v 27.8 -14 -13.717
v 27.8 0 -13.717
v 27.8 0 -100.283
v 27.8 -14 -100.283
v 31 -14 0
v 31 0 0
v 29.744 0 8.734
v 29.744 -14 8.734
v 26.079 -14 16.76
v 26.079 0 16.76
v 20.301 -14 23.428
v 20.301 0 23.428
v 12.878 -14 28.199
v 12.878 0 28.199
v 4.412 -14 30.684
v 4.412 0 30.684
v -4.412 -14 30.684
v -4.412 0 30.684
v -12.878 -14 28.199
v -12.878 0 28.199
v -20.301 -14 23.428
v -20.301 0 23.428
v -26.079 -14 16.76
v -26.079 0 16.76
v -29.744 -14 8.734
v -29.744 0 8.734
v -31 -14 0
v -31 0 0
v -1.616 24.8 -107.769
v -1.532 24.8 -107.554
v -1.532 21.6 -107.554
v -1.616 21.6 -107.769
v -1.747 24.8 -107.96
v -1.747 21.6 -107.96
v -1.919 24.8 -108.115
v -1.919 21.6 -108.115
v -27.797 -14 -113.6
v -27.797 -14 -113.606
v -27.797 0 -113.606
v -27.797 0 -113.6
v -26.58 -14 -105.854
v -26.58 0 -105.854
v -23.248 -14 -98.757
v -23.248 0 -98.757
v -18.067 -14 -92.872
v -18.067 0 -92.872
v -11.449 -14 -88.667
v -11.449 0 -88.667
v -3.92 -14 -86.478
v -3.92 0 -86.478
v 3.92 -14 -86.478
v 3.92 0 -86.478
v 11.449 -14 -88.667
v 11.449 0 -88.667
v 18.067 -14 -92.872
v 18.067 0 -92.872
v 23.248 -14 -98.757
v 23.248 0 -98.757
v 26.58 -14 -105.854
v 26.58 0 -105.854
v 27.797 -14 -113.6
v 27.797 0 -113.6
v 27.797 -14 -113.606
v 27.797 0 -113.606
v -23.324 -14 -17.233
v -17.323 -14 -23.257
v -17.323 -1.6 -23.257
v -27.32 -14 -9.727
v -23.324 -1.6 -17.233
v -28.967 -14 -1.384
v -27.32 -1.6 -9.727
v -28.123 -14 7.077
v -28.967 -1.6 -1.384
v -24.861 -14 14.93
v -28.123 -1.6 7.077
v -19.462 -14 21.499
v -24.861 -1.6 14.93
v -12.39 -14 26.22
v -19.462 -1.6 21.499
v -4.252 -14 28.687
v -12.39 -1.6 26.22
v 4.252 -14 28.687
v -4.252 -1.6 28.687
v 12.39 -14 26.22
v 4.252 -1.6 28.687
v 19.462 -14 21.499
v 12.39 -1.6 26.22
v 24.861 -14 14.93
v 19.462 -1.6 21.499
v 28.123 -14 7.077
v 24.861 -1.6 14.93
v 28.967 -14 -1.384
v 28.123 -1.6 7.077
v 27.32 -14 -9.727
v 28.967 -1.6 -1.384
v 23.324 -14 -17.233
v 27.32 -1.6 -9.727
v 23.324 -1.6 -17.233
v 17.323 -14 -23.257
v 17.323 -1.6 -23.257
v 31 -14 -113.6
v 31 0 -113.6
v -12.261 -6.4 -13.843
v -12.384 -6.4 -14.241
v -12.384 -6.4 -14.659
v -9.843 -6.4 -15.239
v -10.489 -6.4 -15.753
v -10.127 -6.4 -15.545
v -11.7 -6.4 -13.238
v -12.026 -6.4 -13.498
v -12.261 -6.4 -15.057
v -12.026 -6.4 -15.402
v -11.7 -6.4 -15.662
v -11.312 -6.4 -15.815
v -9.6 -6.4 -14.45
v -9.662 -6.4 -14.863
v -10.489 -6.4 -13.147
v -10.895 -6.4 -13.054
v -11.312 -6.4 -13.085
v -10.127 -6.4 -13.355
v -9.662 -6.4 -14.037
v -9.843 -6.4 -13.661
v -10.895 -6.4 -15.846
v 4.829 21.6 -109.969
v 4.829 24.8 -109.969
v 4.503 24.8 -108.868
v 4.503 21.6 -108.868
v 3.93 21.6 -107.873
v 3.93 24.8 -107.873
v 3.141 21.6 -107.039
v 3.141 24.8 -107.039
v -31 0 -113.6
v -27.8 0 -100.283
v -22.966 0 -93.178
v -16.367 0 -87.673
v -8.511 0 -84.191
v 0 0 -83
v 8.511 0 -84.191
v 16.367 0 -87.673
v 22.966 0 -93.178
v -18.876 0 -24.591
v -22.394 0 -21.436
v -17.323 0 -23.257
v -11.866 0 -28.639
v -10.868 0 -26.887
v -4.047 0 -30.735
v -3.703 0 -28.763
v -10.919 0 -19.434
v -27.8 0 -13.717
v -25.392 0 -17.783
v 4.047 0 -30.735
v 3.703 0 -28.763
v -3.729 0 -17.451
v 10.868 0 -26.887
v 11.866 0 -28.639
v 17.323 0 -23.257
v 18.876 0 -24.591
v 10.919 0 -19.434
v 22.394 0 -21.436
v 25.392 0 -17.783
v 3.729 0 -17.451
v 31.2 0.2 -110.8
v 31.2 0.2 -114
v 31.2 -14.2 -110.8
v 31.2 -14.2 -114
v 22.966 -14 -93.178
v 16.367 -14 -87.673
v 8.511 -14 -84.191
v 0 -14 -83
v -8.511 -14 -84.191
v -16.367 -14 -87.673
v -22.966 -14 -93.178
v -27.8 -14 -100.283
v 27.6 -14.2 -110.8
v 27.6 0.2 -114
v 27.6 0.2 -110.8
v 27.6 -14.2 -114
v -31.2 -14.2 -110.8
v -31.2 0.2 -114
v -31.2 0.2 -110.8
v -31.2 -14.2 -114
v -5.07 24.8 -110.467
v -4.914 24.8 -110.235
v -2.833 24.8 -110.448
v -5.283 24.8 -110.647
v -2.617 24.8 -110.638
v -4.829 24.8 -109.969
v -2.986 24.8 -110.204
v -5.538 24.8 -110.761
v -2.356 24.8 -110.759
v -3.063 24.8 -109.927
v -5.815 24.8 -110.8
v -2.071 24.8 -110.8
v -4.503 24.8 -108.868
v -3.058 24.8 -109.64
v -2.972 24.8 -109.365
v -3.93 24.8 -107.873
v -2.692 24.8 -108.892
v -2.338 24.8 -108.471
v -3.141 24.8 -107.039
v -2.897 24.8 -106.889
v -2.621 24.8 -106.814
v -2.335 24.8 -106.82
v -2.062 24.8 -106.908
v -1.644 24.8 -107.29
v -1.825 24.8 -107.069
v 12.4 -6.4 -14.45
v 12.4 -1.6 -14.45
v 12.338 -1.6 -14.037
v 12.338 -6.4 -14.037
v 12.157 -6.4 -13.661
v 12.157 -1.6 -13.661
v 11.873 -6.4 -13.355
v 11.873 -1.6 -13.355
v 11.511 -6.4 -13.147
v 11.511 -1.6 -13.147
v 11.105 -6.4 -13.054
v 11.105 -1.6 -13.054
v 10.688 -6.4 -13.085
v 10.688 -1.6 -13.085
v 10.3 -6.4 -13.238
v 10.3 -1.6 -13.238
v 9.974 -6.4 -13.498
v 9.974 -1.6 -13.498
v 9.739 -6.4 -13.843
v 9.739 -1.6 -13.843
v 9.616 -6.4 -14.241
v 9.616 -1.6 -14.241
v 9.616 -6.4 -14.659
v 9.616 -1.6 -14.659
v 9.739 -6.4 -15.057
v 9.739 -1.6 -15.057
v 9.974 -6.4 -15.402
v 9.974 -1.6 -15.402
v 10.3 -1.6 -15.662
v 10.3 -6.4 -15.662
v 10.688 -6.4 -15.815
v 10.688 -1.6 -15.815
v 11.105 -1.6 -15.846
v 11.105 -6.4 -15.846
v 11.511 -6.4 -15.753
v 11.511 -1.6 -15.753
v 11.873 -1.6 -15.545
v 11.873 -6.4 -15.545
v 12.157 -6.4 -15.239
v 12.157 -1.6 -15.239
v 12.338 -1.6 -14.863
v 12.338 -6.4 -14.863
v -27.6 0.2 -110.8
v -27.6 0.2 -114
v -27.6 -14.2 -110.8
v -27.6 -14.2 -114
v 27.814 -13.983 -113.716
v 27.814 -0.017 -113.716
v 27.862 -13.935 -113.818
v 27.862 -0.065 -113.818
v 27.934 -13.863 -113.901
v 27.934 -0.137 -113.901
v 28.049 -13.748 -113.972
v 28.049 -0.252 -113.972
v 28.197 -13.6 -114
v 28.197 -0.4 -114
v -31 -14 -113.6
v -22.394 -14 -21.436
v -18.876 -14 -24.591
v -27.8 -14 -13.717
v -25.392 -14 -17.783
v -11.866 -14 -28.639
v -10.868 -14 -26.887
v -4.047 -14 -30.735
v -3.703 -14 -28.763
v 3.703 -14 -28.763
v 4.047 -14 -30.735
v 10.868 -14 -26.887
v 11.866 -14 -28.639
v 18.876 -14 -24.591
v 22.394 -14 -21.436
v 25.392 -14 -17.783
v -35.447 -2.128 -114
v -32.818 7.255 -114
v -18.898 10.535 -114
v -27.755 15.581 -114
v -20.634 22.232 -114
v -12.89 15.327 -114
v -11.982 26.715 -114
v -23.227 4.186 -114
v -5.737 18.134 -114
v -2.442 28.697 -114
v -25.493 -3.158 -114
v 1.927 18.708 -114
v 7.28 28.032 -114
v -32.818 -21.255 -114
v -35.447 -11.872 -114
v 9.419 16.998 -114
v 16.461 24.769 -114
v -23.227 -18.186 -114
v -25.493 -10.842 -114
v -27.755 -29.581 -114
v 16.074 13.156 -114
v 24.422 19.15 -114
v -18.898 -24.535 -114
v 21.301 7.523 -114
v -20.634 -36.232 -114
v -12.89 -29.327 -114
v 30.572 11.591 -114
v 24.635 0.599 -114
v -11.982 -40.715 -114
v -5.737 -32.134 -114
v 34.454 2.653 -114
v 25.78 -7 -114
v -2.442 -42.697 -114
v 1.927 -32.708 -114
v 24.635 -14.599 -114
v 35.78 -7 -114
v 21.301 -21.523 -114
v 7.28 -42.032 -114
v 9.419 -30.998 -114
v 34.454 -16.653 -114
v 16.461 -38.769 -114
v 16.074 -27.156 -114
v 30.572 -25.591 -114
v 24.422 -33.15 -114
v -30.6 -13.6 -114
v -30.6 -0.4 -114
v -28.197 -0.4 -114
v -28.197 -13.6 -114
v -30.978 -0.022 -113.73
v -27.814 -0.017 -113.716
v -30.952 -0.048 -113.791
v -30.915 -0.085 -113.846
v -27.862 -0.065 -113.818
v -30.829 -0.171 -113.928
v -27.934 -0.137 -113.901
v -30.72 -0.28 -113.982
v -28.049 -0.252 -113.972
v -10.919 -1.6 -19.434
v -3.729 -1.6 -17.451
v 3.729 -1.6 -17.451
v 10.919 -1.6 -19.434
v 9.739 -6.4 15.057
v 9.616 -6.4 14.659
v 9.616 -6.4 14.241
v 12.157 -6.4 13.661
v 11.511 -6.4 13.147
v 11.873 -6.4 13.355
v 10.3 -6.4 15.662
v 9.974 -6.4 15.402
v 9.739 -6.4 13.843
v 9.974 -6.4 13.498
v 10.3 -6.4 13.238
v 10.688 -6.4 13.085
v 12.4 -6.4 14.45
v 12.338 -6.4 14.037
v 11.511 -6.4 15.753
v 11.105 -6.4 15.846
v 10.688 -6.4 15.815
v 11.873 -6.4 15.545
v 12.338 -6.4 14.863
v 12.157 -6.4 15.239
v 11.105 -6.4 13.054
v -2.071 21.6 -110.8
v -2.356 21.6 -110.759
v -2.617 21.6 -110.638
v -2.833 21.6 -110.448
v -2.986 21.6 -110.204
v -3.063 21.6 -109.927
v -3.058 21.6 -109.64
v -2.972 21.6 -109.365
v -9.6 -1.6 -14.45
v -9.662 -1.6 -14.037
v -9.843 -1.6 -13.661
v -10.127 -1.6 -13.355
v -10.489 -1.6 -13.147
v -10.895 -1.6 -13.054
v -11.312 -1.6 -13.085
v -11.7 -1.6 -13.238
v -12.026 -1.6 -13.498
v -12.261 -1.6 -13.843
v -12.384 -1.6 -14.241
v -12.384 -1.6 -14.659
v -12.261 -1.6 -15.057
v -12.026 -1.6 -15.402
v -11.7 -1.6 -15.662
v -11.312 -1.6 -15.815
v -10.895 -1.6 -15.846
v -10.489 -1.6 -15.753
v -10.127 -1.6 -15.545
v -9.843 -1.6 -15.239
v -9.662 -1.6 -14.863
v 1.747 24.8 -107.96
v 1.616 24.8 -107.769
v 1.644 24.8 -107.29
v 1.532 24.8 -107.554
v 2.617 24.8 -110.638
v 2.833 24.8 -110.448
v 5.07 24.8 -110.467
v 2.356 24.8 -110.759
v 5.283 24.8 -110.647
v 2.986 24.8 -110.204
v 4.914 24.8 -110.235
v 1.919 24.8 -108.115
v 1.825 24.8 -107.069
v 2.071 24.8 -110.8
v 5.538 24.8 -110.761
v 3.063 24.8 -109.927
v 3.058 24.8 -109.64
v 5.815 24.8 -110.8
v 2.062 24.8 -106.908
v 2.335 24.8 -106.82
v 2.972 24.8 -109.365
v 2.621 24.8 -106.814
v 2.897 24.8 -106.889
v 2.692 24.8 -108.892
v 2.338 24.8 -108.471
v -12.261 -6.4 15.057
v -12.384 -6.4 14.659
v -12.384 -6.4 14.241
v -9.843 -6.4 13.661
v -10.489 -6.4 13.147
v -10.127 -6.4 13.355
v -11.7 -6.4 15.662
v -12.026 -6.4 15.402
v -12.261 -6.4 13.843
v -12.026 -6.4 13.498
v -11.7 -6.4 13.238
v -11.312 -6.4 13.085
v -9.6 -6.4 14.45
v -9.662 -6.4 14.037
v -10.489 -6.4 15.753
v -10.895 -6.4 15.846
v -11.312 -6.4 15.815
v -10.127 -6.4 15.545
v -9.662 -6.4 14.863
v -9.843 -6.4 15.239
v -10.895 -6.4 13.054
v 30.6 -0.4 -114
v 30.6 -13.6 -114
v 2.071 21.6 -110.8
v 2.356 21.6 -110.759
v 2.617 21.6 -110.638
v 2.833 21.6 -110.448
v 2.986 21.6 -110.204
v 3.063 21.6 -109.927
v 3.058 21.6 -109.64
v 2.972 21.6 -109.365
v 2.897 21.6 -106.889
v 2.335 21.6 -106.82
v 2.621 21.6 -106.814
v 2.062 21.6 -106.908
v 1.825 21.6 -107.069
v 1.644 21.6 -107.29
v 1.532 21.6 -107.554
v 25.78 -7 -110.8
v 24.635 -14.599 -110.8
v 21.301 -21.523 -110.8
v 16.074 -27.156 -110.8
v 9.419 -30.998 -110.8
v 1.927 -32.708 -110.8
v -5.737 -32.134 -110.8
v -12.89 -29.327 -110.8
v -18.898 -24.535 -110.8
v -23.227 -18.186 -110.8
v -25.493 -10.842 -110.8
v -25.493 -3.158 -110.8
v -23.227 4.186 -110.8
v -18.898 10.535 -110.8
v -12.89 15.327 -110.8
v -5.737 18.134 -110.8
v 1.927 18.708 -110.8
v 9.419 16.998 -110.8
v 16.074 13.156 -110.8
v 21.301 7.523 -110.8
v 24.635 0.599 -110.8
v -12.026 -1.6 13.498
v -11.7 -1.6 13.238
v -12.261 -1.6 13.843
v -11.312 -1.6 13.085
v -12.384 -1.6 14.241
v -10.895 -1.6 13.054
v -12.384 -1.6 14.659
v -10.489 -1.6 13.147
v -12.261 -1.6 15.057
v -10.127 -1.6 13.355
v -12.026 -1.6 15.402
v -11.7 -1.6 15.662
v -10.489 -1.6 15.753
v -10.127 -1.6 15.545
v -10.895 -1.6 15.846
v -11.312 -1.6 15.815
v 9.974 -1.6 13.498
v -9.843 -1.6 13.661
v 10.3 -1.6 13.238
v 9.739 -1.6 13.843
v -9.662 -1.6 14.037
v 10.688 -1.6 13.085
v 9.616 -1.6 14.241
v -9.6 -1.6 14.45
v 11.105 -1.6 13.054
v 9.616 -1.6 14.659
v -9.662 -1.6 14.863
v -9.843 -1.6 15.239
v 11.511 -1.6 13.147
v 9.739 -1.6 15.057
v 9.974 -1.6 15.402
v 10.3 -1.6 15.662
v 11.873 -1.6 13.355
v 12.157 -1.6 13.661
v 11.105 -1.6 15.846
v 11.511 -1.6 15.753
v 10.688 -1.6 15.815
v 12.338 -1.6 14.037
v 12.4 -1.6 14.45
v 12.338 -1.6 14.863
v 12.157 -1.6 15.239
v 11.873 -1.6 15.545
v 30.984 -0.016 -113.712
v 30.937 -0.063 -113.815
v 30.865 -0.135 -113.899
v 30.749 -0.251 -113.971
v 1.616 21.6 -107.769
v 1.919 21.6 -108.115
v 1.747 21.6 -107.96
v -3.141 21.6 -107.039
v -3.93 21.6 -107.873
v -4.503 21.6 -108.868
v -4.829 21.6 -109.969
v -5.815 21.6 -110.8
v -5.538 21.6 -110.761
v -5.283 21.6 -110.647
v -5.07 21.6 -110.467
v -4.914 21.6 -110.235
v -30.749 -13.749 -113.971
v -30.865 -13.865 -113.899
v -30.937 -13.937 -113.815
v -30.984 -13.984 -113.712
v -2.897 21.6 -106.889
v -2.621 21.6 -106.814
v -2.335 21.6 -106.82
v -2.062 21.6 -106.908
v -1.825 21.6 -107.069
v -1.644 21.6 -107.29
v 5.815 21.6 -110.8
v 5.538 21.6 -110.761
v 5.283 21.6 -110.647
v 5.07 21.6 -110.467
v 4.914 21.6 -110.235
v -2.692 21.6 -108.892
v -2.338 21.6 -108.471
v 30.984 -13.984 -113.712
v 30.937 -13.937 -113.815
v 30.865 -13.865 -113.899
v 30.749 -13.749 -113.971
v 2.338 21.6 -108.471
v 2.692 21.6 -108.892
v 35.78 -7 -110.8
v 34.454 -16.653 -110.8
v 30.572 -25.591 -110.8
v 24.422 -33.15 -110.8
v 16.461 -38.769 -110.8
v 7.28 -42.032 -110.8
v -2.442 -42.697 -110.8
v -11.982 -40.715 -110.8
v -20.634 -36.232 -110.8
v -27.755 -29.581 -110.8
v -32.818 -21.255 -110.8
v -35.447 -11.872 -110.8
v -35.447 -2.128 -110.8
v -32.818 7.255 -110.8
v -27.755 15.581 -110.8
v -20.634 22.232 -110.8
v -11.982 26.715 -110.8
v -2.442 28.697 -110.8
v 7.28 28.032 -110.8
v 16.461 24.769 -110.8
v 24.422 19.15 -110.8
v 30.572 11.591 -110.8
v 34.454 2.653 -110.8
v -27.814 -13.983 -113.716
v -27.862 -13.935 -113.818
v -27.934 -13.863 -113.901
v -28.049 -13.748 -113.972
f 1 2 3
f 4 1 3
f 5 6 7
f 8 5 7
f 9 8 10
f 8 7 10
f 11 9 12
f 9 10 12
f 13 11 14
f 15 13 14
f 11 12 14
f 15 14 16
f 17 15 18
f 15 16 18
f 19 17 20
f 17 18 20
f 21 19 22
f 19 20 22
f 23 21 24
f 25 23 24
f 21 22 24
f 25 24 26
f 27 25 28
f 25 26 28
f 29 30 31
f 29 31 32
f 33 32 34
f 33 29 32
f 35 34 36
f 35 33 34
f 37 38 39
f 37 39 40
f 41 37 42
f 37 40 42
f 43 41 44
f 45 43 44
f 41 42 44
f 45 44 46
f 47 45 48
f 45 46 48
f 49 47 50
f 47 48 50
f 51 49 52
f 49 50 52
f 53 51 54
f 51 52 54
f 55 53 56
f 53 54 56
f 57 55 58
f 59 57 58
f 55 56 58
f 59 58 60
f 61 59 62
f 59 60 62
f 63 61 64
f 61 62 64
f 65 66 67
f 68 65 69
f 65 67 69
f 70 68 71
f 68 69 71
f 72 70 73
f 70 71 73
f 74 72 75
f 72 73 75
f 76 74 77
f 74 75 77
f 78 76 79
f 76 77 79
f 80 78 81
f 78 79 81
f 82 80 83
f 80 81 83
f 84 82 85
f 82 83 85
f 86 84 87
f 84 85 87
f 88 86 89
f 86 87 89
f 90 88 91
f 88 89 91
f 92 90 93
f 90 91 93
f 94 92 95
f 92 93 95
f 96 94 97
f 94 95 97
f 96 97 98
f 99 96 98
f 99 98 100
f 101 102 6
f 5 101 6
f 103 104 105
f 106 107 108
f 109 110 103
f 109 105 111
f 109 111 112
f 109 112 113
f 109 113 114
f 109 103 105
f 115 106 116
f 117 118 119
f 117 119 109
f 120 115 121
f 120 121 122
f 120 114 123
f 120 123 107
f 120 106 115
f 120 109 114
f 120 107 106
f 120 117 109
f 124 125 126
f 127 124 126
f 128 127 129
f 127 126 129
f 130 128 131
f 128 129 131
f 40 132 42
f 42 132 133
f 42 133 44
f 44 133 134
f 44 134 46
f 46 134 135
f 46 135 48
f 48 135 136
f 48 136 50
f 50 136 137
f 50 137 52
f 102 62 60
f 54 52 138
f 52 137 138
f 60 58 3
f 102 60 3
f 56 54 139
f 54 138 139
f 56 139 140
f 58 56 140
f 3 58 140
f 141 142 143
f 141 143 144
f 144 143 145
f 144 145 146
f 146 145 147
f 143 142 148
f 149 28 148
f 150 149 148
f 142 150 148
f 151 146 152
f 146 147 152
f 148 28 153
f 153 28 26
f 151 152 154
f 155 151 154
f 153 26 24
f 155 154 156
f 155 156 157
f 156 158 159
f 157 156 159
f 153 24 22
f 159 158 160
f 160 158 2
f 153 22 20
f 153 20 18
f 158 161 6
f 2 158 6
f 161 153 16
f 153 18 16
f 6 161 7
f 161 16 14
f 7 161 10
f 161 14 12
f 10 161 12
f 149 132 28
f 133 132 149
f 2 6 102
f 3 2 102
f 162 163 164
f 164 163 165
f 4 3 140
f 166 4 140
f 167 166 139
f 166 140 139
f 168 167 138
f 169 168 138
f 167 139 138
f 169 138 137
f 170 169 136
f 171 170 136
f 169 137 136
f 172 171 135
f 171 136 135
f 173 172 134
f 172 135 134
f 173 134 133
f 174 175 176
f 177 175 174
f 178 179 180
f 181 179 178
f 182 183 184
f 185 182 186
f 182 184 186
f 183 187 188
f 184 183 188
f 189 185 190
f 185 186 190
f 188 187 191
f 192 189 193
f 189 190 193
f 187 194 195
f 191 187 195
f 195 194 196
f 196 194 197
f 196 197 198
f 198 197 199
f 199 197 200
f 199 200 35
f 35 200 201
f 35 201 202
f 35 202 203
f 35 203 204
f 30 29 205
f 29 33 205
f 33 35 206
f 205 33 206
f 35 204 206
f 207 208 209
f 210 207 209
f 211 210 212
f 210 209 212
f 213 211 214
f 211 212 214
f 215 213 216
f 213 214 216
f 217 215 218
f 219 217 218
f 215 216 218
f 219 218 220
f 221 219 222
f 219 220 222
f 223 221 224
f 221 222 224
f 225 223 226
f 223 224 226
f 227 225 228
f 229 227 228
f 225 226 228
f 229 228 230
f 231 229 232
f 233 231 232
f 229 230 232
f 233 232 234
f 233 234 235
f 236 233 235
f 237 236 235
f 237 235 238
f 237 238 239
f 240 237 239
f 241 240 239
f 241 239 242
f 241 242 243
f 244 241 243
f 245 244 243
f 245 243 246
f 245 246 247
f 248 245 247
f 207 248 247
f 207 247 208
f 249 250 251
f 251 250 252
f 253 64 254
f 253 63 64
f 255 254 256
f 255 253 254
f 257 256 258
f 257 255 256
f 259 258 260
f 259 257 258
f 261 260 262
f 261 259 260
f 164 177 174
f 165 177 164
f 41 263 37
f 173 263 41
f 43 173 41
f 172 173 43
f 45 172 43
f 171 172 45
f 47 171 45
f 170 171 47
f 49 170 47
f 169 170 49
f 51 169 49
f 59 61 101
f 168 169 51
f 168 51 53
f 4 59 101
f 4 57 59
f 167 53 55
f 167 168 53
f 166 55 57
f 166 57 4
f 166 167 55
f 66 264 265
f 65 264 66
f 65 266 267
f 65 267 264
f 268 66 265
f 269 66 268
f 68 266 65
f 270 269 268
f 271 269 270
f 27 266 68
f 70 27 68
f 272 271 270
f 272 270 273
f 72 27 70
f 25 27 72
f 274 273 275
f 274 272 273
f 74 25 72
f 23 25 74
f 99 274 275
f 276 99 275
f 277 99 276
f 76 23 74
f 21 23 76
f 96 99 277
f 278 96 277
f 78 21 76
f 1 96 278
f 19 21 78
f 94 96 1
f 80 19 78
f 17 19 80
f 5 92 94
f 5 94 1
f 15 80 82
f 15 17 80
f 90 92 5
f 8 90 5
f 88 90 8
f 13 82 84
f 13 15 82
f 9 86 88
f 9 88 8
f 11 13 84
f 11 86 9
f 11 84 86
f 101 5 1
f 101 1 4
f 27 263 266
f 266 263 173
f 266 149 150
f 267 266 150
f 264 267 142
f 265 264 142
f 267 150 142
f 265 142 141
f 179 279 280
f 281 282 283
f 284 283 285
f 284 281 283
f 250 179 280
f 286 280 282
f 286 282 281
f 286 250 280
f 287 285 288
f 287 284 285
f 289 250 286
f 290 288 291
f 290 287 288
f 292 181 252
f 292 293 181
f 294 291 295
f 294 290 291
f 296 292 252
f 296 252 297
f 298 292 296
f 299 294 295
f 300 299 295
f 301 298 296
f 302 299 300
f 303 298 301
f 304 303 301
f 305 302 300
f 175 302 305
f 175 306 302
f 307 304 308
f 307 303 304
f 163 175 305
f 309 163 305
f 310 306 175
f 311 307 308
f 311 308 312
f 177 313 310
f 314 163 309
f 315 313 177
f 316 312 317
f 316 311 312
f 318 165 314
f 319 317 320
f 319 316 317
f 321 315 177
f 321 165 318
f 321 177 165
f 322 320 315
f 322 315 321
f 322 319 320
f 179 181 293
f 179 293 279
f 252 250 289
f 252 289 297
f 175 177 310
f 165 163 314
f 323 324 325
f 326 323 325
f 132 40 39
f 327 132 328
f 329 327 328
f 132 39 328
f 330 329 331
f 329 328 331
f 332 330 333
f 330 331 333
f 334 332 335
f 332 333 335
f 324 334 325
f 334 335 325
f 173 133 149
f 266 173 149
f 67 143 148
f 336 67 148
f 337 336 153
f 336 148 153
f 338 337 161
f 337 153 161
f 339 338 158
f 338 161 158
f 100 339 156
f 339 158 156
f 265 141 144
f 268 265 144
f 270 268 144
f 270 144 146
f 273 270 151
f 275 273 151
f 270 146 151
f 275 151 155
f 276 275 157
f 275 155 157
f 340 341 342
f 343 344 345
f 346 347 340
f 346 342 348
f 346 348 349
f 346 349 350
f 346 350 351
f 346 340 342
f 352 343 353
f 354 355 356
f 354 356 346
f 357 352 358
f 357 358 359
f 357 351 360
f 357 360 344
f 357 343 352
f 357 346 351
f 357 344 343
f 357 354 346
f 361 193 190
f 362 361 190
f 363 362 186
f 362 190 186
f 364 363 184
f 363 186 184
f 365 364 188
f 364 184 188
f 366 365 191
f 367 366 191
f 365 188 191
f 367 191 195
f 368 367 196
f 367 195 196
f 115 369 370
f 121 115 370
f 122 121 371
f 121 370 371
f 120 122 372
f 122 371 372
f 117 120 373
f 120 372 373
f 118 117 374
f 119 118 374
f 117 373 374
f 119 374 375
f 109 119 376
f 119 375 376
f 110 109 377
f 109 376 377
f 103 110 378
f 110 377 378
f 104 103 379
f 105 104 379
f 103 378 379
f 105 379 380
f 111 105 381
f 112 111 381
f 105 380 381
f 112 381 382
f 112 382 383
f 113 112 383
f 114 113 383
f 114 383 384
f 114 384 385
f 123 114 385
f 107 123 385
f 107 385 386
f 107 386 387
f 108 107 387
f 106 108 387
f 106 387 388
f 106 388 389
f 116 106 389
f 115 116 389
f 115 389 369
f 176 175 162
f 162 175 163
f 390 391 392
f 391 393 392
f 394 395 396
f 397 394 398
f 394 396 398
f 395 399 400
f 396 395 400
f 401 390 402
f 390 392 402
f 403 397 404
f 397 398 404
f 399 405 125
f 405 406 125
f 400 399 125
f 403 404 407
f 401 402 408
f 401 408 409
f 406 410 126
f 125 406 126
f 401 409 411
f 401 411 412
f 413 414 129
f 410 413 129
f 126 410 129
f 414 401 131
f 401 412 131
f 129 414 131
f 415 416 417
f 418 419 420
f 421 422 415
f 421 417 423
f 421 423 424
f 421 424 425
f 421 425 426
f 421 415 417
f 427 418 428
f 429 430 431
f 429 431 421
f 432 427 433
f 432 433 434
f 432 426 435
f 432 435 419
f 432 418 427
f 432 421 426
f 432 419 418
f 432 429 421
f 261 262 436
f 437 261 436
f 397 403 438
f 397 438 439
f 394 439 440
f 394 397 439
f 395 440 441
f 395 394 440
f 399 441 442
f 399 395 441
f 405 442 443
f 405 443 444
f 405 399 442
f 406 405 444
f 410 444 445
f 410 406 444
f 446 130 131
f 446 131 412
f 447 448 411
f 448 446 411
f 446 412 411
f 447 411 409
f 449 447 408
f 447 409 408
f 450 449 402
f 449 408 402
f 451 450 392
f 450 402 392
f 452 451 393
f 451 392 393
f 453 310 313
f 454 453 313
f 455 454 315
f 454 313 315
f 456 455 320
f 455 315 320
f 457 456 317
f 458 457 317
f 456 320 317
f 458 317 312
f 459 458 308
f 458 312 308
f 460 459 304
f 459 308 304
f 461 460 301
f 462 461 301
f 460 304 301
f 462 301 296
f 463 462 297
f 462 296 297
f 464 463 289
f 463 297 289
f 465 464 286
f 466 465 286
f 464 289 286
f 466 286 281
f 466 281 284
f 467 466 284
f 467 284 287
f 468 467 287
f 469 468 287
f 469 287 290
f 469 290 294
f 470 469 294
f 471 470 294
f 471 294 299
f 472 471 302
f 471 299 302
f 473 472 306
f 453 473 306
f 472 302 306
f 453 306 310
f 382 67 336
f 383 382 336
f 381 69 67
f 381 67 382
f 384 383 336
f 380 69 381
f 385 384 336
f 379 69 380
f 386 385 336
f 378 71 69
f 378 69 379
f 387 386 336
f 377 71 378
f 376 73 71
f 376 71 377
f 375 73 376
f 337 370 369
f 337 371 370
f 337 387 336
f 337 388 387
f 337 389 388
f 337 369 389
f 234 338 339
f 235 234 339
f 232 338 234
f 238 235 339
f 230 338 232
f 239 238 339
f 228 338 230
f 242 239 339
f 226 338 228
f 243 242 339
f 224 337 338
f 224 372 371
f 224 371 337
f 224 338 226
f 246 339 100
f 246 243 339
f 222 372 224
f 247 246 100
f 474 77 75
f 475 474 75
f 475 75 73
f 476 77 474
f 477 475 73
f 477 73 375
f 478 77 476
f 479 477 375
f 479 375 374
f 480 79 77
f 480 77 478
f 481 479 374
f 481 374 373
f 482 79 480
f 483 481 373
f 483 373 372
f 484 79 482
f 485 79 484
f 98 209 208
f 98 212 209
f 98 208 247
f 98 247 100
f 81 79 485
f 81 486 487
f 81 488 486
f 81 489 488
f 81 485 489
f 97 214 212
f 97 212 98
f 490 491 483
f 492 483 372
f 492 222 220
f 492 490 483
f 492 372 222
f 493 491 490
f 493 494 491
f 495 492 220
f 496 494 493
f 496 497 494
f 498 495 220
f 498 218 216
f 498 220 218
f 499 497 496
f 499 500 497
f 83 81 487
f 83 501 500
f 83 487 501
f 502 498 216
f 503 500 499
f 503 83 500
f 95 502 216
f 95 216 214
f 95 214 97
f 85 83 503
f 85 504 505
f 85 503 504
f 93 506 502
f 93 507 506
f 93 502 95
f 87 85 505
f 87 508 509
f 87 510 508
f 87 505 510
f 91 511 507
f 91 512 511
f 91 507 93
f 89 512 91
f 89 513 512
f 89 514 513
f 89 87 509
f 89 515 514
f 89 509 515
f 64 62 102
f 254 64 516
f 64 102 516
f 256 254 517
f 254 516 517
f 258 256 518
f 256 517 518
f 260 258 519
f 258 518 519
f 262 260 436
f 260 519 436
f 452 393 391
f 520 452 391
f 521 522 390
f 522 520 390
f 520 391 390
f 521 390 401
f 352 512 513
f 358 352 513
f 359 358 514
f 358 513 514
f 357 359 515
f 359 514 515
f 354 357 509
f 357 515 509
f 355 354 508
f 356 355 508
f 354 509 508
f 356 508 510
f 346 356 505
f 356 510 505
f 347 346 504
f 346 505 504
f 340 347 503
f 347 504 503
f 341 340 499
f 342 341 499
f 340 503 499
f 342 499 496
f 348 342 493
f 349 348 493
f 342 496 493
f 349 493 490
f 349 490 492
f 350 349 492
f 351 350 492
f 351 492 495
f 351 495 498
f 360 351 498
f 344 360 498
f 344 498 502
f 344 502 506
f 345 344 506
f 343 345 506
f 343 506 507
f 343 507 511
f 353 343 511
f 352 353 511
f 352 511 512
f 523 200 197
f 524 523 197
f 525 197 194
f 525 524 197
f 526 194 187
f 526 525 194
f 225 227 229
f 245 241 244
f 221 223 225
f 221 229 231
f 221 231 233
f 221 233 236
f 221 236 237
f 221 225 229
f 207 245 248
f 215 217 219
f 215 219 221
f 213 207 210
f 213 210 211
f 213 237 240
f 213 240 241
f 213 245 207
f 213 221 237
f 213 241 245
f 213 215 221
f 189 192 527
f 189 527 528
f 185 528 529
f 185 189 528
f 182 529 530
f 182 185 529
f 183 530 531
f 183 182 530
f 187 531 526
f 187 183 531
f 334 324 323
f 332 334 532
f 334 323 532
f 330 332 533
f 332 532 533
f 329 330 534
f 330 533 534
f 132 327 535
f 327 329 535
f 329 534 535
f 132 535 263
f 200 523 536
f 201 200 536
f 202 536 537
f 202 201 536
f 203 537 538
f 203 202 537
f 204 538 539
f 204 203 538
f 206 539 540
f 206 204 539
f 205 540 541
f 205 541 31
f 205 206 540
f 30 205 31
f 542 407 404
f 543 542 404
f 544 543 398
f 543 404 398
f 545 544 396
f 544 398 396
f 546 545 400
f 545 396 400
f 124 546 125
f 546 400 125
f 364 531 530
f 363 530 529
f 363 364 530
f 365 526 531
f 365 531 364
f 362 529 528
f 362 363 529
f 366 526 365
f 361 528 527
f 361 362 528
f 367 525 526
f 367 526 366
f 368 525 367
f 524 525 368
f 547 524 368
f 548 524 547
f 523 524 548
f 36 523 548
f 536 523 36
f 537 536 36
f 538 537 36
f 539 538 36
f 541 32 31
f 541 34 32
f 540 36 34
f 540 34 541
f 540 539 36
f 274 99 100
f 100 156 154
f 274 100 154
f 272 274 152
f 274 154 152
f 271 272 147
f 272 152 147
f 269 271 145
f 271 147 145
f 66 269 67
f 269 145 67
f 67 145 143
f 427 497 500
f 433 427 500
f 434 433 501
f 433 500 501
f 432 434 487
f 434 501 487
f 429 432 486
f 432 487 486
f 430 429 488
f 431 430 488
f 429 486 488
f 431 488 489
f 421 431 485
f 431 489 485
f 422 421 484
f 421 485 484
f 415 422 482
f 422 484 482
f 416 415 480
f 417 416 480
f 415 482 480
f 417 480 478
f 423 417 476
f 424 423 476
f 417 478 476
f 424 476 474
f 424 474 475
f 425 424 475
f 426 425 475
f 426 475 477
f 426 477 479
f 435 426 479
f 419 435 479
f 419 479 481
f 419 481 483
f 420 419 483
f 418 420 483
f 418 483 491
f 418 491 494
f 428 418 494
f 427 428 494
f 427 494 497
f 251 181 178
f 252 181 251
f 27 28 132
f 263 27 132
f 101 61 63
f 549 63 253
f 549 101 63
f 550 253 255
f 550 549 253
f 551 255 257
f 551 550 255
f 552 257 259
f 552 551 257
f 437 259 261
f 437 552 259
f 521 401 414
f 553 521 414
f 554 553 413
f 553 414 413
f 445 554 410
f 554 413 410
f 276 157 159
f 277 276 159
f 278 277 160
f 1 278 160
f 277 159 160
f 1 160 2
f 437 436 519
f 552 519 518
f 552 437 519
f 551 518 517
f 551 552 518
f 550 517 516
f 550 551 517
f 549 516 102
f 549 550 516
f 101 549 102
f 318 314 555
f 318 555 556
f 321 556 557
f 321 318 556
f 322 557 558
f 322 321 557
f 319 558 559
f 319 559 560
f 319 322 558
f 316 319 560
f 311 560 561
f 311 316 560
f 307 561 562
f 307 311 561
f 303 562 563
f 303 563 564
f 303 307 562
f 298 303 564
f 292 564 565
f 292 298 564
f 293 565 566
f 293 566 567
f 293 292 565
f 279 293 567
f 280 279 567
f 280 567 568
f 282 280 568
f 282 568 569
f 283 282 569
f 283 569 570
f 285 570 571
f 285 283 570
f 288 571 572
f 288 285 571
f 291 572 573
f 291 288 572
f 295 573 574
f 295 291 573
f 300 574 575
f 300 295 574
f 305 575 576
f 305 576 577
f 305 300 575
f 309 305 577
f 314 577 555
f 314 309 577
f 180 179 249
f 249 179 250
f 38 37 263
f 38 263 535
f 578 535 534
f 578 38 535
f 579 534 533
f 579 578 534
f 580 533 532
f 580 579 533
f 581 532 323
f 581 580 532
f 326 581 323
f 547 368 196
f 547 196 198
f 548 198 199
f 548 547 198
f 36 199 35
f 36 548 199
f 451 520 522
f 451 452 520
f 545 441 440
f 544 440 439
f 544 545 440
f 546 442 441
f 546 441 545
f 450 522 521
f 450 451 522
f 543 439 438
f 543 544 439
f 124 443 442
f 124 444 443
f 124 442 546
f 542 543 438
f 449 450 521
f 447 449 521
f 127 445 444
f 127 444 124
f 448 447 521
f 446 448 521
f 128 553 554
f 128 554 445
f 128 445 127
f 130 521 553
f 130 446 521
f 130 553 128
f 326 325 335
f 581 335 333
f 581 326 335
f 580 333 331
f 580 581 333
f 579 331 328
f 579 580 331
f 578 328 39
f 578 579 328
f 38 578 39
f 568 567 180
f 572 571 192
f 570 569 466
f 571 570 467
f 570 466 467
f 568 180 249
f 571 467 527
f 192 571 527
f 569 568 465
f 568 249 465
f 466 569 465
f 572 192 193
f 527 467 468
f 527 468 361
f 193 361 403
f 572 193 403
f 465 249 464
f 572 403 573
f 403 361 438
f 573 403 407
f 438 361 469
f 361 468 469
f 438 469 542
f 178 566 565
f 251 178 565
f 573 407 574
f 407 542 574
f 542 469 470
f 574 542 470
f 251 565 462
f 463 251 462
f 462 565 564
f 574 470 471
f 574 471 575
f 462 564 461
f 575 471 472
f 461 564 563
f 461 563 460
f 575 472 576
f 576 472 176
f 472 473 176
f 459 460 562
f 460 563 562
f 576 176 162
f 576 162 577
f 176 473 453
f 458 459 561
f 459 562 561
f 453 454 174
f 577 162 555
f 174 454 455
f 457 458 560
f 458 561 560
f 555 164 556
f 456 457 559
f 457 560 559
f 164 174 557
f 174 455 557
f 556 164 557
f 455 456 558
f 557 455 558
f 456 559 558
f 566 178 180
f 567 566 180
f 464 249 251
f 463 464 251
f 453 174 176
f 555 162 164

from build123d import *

# Parameters (mm, degrees)
F1_DEPTH    = 14
F0_R        = 1.4
F2_DEPTH    = 1.6
F3_DEPTH    = 6.4
F4_R        = 35.7804971641
F4_W        = 3.6
F4_H        = 14.4
F4_R_2      = 25.7804971641
F5_DEPTH    = 3.2
F8_DEPTH    = 1.6
F9_T1_DEPTH = 3.2
F9_T3_DEPTH = 5.9959172278
F9_T5_DEPTH = 12.5675364253
F10_R       = 0.4


# Not quite as in the source:
# - a fillet or chamfer that OpenCascade refuses, or shapes differently, is made with other operations: its cross-section is extruded or revolved along the edge and cut away or added


with BuildPart() as f1:
    # F0 (on Front) → F1 (new body)
    with BuildSketch(Plane.XZ):
        with BuildLine():
            ThreePointArc((17.3232920146, -23.2573333333), (0, -29), (-17.3232920146, -23.2573333333))
            ThreePointArc((-17.3232920146, -23.2573333333), (-18.1118631329, -23.9097080661), (-18.8758870755, -24.5906666667))
            ThreePointArc((-18.8758870755, -24.5906666667), (0, -31), (18.8758870755, -24.5906666667))
            ThreePointArc((18.8758870755, -24.5906666667), (18.1118631329, -23.9097080661), (17.3232920146, -23.2573333333))
        make_face()
        with BuildLine():
            ThreePointArc((-17.3232920146, -23.2573333333), (-13.0120046799, 25.9169391366), (29, 0))
            ThreePointArc((29, 0), (25.9169391366, -13.0120046799), (17.3232920146, -23.2573333333))
            ThreePointArc((17.3232920146, -23.2573333333), (18.1118631329, -23.9097080661), (18.8758870755, -24.5906666667))
            ThreePointArc((18.8758870755, -24.5906666667), (23.9628460371, -19.6667742602), (27.8, -13.7171425596))
            Line((27.8, -13.7171425596), (27.8, -45))
            Line((27.8, -45), (27.8, -100.2828574404))
            Line((27.8, -100.2828574404), (27.8, -114))
            Line((27.8, -114), (31, -114))
            Line((31, -114), (31, 0))
            ThreePointArc((31, 0), (0, 31), (-31, 0))
            Line((-31, 0), (-31, -114))
            Line((-31, -114), (-27.8, -114))
            Line((-27.8, -114), (-27.8, -100.2828574404))
            Line((-27.8, -100.2828574404), (-27.8, -45))
            Line((-27.8, -45), (-27.8, -13.7171425596))
            ThreePointArc((-27.8, -13.7171425596), (-23.9628460371, -19.6667742602), (-18.8758870755, -24.5906666667))
            ThreePointArc((-18.8758870755, -24.5906666667), (-18.1118631329, -23.9097080661), (-17.3232920146, -23.2573333333))
        make_face()
        with BuildLine():
            ThreePointArc((27.8, -100.2828574404), (0, -83), (-27.8, -100.2828574404))
            Line((-27.8, -100.2828574404), (-27.8, -114))
            ThreePointArc((-27.8, -114), (0, -86.2), (27.8, -114))
            Line((27.8, -114), (27.8, -100.2828574404))
        make_face()
    extrude(amount=F1_DEPTH)

    # F0 (on Front) → F2 (join)
    with BuildSketch(Plane.XZ):
        with BuildLine():
            ThreePointArc((17.3232920146, -23.2573333333), (25.9169391366, -13.0120046799), (29, 0))
            ThreePointArc((29, 0), (-13.0120046799, 25.9169391366), (-17.3232920146, -23.2573333333))
            ThreePointArc((-17.3232920146, -23.2573333333), (0, -17.2), (17.3232920146, -23.2573333333))
        make_face()
        with Locations((-11, -14.45)):
            Circle(F0_R, mode=Mode.SUBTRACT)
        with Locations((-11, 14.45)):
            Circle(F0_R, mode=Mode.SUBTRACT)
        with Locations((11, -14.45)):
            Circle(F0_R, mode=Mode.SUBTRACT)
        with Locations((11, 14.45)):
            Circle(F0_R, mode=Mode.SUBTRACT)
    extrude(amount=F2_DEPTH)

    # F0 (on Front) → F3 (join)
    with BuildSketch(Plane.XZ):
        with Locations((11, -14.45)):
            Circle(F0_R)
        with Locations((-11, -14.45)):
            Circle(F0_R)
        with Locations((-11, 14.45)):
            Circle(F0_R)
        with Locations((11, 14.45)):
            Circle(F0_R)
    extrude(amount=F3_DEPTH)

    # F10
    f10_edges = [f1.edges().sort_by_distance(p)[0] for p in [
        (27.8, -7, -114),
        (31, -7, -114),
        (29.4, -14, -114),
        (29.4, 0, -114),
        (-29.4, 0, -114),
        (-31, -7, -114),
        (-27.8, -7, -114),
        (-29.4, -14, -114),
    ]]
    fillet(f10_edges, radius=F10_R)


with BuildPart() as f5:
    # F4 (on face) → F5 (new body)
    with BuildSketch(Plane(origin=(0, 0, -114), x_dir=(1, 0, 0), z_dir=(0, 0, -1))):
        with Locations((0, 7)):
            Circle(F4_R)
        with Locations((-29.4, 7)):
            Rectangle(F4_W, F4_H, mode=Mode.SUBTRACT)
        with Locations((0, 7)):
            Circle(F4_R_2, mode=Mode.SUBTRACT)
        with Locations((29.4, 7)):
            Rectangle(F4_W, F4_H, mode=Mode.SUBTRACT)
    extrude(amount=-F5_DEPTH)

    # F7 (on offset) → F8 (join, symmetric)
    with BuildSketch(Plane.XZ.offset(-23.2)):
        with BuildLine():
            ThreePointArc((1.5, -107.8606123087), (2.8142494559, -109.076631206), (3.3, -110.8))
            Line((3.3, -110.8), (4.9, -110.8))
            ThreePointArc((4.9, -110.8), (3.9597979746, -107.9138260621), (1.5, -106.1352384841))
            Line((1.5, -106.1352384841), (1.5, -107.8606123087))
        make_face()
        with BuildLine():
            Line((-4.9, -110.8), (-3.3, -110.8))
            ThreePointArc((-3.3, -110.8), (-2.8142494559, -109.076631206), (-1.5, -107.8606123087))
            Line((-1.5, -107.8606123087), (-1.5, -106.1352384841))
            ThreePointArc((-1.5, -106.1352384841), (-3.9597979746, -107.9138260621), (-4.9, -110.8))
        make_face()
    extrude(amount=F8_DEPTH, both=True)

    # F9: fillet of radius 1 on 8 edges, made by hand

    # F9_s2 → F9_t1 (join)
    with BuildSketch(Plane.XZ.offset(-24.8)):
        with BuildLine():
            ThreePointArc((5.814636704, -110.8), (5.1702344715, -110.5646867089), (4.8291050593, -109.9694915254))
            ThreePointArc((4.8291050593, -109.9694915254), (4.8822440942, -110.3832355525), (4.9, -110.8))
            Line((4.9, -110.8), (5.814636704, -110.8))
        make_face()
        with BuildLine():
            ThreePointArc((-5.814636704, -110.8), (-5.1702344715, -110.5646867089), (-4.8291050593, -109.9694915254))
            ThreePointArc((-4.8291050593, -109.9694915254), (-4.8822440942, -110.3832355525), (-4.9, -110.8))
            Line((-4.9, -110.8), (-5.814636704, -110.8))
        make_face()
        with BuildLine():
            ThreePointArc((2.0712315177, -110.8), (2.9182210716, -110.3316095331), (2.9717669602, -109.3652173913))
            ThreePointArc((2.9717669602, -109.3652173913), (3.2168953176, -110.0640757405), (3.3, -110.8))
            Line((3.3, -110.8), (2.0712315177, -110.8))
        make_face()
        with BuildLine():
            ThreePointArc((-2.0712315177, -110.8), (-2.9182210716, -110.3316095331), (-2.9717669602, -109.3652173913))
            ThreePointArc((-2.9717669602, -109.3652173913), (-3.2168953176, -110.0640757405), (-3.3, -110.8))
            Line((-3.3, -110.8), (-2.0712315177, -110.8))
        make_face()
    extrude(amount=F9_T1_DEPTH)

    # F9_s4 → F9_t3 (cut)
    with BuildSketch(Plane.XZ.offset(-26.1979586139)):
        with BuildLine():
            ThreePointArc((1.5, -107.3014288631), (1.6107881724, -107.7589245741), (1.9186046512, -108.1150500577))
            ThreePointArc((1.9186046512, -108.1150500577), (1.7140300704, -107.9800530293), (1.5, -107.8606123087))
            Line((1.5, -107.8606123087), (1.5, -107.3014288631))
        make_face()
        with BuildLine():
            ThreePointArc((-1.5, -107.3014288631), (-1.6107881724, -107.7589245741), (-1.9186046512, -108.1150500577))
            ThreePointArc((-1.9186046512, -108.1150500577), (-1.7140300704, -107.9800530293), (-1.5, -107.8606123087))
            Line((-1.5, -107.8606123087), (-1.5, -107.3014288631))
        make_face()
    extrude(amount=F9_T3_DEPTH, mode=Mode.SUBTRACT)

    # F9_s6 → F9_t5 (cut)
    with BuildSketch(Plane.XZ.offset(-29.4837682127)):
        with BuildLine():
            ThreePointArc((3.141025641, -107.0391546266), (2.0763407271, -106.9008524633), (1.5, -107.8066740906))
            Line((1.5, -107.8066740906), (1.5, -106.1352384841))
            ThreePointArc((1.5, -106.1352384841), (2.3641162933, -106.5080360962), (3.141025641, -107.0391546266))
        make_face()
        with BuildLine():
            ThreePointArc((-3.141025641, -107.0391546266), (-2.0763407271, -106.9008524633), (-1.5, -107.8066740906))
            Line((-1.5, -107.8066740906), (-1.5, -106.1352384841))
            ThreePointArc((-1.5, -106.1352384841), (-2.3641162933, -106.5080360962), (-3.141025641, -107.0391546266))
        make_face()
    extrude(amount=F9_T5_DEPTH, mode=Mode.SUBTRACT)


solid = Compound([f1.part, f5.part])
